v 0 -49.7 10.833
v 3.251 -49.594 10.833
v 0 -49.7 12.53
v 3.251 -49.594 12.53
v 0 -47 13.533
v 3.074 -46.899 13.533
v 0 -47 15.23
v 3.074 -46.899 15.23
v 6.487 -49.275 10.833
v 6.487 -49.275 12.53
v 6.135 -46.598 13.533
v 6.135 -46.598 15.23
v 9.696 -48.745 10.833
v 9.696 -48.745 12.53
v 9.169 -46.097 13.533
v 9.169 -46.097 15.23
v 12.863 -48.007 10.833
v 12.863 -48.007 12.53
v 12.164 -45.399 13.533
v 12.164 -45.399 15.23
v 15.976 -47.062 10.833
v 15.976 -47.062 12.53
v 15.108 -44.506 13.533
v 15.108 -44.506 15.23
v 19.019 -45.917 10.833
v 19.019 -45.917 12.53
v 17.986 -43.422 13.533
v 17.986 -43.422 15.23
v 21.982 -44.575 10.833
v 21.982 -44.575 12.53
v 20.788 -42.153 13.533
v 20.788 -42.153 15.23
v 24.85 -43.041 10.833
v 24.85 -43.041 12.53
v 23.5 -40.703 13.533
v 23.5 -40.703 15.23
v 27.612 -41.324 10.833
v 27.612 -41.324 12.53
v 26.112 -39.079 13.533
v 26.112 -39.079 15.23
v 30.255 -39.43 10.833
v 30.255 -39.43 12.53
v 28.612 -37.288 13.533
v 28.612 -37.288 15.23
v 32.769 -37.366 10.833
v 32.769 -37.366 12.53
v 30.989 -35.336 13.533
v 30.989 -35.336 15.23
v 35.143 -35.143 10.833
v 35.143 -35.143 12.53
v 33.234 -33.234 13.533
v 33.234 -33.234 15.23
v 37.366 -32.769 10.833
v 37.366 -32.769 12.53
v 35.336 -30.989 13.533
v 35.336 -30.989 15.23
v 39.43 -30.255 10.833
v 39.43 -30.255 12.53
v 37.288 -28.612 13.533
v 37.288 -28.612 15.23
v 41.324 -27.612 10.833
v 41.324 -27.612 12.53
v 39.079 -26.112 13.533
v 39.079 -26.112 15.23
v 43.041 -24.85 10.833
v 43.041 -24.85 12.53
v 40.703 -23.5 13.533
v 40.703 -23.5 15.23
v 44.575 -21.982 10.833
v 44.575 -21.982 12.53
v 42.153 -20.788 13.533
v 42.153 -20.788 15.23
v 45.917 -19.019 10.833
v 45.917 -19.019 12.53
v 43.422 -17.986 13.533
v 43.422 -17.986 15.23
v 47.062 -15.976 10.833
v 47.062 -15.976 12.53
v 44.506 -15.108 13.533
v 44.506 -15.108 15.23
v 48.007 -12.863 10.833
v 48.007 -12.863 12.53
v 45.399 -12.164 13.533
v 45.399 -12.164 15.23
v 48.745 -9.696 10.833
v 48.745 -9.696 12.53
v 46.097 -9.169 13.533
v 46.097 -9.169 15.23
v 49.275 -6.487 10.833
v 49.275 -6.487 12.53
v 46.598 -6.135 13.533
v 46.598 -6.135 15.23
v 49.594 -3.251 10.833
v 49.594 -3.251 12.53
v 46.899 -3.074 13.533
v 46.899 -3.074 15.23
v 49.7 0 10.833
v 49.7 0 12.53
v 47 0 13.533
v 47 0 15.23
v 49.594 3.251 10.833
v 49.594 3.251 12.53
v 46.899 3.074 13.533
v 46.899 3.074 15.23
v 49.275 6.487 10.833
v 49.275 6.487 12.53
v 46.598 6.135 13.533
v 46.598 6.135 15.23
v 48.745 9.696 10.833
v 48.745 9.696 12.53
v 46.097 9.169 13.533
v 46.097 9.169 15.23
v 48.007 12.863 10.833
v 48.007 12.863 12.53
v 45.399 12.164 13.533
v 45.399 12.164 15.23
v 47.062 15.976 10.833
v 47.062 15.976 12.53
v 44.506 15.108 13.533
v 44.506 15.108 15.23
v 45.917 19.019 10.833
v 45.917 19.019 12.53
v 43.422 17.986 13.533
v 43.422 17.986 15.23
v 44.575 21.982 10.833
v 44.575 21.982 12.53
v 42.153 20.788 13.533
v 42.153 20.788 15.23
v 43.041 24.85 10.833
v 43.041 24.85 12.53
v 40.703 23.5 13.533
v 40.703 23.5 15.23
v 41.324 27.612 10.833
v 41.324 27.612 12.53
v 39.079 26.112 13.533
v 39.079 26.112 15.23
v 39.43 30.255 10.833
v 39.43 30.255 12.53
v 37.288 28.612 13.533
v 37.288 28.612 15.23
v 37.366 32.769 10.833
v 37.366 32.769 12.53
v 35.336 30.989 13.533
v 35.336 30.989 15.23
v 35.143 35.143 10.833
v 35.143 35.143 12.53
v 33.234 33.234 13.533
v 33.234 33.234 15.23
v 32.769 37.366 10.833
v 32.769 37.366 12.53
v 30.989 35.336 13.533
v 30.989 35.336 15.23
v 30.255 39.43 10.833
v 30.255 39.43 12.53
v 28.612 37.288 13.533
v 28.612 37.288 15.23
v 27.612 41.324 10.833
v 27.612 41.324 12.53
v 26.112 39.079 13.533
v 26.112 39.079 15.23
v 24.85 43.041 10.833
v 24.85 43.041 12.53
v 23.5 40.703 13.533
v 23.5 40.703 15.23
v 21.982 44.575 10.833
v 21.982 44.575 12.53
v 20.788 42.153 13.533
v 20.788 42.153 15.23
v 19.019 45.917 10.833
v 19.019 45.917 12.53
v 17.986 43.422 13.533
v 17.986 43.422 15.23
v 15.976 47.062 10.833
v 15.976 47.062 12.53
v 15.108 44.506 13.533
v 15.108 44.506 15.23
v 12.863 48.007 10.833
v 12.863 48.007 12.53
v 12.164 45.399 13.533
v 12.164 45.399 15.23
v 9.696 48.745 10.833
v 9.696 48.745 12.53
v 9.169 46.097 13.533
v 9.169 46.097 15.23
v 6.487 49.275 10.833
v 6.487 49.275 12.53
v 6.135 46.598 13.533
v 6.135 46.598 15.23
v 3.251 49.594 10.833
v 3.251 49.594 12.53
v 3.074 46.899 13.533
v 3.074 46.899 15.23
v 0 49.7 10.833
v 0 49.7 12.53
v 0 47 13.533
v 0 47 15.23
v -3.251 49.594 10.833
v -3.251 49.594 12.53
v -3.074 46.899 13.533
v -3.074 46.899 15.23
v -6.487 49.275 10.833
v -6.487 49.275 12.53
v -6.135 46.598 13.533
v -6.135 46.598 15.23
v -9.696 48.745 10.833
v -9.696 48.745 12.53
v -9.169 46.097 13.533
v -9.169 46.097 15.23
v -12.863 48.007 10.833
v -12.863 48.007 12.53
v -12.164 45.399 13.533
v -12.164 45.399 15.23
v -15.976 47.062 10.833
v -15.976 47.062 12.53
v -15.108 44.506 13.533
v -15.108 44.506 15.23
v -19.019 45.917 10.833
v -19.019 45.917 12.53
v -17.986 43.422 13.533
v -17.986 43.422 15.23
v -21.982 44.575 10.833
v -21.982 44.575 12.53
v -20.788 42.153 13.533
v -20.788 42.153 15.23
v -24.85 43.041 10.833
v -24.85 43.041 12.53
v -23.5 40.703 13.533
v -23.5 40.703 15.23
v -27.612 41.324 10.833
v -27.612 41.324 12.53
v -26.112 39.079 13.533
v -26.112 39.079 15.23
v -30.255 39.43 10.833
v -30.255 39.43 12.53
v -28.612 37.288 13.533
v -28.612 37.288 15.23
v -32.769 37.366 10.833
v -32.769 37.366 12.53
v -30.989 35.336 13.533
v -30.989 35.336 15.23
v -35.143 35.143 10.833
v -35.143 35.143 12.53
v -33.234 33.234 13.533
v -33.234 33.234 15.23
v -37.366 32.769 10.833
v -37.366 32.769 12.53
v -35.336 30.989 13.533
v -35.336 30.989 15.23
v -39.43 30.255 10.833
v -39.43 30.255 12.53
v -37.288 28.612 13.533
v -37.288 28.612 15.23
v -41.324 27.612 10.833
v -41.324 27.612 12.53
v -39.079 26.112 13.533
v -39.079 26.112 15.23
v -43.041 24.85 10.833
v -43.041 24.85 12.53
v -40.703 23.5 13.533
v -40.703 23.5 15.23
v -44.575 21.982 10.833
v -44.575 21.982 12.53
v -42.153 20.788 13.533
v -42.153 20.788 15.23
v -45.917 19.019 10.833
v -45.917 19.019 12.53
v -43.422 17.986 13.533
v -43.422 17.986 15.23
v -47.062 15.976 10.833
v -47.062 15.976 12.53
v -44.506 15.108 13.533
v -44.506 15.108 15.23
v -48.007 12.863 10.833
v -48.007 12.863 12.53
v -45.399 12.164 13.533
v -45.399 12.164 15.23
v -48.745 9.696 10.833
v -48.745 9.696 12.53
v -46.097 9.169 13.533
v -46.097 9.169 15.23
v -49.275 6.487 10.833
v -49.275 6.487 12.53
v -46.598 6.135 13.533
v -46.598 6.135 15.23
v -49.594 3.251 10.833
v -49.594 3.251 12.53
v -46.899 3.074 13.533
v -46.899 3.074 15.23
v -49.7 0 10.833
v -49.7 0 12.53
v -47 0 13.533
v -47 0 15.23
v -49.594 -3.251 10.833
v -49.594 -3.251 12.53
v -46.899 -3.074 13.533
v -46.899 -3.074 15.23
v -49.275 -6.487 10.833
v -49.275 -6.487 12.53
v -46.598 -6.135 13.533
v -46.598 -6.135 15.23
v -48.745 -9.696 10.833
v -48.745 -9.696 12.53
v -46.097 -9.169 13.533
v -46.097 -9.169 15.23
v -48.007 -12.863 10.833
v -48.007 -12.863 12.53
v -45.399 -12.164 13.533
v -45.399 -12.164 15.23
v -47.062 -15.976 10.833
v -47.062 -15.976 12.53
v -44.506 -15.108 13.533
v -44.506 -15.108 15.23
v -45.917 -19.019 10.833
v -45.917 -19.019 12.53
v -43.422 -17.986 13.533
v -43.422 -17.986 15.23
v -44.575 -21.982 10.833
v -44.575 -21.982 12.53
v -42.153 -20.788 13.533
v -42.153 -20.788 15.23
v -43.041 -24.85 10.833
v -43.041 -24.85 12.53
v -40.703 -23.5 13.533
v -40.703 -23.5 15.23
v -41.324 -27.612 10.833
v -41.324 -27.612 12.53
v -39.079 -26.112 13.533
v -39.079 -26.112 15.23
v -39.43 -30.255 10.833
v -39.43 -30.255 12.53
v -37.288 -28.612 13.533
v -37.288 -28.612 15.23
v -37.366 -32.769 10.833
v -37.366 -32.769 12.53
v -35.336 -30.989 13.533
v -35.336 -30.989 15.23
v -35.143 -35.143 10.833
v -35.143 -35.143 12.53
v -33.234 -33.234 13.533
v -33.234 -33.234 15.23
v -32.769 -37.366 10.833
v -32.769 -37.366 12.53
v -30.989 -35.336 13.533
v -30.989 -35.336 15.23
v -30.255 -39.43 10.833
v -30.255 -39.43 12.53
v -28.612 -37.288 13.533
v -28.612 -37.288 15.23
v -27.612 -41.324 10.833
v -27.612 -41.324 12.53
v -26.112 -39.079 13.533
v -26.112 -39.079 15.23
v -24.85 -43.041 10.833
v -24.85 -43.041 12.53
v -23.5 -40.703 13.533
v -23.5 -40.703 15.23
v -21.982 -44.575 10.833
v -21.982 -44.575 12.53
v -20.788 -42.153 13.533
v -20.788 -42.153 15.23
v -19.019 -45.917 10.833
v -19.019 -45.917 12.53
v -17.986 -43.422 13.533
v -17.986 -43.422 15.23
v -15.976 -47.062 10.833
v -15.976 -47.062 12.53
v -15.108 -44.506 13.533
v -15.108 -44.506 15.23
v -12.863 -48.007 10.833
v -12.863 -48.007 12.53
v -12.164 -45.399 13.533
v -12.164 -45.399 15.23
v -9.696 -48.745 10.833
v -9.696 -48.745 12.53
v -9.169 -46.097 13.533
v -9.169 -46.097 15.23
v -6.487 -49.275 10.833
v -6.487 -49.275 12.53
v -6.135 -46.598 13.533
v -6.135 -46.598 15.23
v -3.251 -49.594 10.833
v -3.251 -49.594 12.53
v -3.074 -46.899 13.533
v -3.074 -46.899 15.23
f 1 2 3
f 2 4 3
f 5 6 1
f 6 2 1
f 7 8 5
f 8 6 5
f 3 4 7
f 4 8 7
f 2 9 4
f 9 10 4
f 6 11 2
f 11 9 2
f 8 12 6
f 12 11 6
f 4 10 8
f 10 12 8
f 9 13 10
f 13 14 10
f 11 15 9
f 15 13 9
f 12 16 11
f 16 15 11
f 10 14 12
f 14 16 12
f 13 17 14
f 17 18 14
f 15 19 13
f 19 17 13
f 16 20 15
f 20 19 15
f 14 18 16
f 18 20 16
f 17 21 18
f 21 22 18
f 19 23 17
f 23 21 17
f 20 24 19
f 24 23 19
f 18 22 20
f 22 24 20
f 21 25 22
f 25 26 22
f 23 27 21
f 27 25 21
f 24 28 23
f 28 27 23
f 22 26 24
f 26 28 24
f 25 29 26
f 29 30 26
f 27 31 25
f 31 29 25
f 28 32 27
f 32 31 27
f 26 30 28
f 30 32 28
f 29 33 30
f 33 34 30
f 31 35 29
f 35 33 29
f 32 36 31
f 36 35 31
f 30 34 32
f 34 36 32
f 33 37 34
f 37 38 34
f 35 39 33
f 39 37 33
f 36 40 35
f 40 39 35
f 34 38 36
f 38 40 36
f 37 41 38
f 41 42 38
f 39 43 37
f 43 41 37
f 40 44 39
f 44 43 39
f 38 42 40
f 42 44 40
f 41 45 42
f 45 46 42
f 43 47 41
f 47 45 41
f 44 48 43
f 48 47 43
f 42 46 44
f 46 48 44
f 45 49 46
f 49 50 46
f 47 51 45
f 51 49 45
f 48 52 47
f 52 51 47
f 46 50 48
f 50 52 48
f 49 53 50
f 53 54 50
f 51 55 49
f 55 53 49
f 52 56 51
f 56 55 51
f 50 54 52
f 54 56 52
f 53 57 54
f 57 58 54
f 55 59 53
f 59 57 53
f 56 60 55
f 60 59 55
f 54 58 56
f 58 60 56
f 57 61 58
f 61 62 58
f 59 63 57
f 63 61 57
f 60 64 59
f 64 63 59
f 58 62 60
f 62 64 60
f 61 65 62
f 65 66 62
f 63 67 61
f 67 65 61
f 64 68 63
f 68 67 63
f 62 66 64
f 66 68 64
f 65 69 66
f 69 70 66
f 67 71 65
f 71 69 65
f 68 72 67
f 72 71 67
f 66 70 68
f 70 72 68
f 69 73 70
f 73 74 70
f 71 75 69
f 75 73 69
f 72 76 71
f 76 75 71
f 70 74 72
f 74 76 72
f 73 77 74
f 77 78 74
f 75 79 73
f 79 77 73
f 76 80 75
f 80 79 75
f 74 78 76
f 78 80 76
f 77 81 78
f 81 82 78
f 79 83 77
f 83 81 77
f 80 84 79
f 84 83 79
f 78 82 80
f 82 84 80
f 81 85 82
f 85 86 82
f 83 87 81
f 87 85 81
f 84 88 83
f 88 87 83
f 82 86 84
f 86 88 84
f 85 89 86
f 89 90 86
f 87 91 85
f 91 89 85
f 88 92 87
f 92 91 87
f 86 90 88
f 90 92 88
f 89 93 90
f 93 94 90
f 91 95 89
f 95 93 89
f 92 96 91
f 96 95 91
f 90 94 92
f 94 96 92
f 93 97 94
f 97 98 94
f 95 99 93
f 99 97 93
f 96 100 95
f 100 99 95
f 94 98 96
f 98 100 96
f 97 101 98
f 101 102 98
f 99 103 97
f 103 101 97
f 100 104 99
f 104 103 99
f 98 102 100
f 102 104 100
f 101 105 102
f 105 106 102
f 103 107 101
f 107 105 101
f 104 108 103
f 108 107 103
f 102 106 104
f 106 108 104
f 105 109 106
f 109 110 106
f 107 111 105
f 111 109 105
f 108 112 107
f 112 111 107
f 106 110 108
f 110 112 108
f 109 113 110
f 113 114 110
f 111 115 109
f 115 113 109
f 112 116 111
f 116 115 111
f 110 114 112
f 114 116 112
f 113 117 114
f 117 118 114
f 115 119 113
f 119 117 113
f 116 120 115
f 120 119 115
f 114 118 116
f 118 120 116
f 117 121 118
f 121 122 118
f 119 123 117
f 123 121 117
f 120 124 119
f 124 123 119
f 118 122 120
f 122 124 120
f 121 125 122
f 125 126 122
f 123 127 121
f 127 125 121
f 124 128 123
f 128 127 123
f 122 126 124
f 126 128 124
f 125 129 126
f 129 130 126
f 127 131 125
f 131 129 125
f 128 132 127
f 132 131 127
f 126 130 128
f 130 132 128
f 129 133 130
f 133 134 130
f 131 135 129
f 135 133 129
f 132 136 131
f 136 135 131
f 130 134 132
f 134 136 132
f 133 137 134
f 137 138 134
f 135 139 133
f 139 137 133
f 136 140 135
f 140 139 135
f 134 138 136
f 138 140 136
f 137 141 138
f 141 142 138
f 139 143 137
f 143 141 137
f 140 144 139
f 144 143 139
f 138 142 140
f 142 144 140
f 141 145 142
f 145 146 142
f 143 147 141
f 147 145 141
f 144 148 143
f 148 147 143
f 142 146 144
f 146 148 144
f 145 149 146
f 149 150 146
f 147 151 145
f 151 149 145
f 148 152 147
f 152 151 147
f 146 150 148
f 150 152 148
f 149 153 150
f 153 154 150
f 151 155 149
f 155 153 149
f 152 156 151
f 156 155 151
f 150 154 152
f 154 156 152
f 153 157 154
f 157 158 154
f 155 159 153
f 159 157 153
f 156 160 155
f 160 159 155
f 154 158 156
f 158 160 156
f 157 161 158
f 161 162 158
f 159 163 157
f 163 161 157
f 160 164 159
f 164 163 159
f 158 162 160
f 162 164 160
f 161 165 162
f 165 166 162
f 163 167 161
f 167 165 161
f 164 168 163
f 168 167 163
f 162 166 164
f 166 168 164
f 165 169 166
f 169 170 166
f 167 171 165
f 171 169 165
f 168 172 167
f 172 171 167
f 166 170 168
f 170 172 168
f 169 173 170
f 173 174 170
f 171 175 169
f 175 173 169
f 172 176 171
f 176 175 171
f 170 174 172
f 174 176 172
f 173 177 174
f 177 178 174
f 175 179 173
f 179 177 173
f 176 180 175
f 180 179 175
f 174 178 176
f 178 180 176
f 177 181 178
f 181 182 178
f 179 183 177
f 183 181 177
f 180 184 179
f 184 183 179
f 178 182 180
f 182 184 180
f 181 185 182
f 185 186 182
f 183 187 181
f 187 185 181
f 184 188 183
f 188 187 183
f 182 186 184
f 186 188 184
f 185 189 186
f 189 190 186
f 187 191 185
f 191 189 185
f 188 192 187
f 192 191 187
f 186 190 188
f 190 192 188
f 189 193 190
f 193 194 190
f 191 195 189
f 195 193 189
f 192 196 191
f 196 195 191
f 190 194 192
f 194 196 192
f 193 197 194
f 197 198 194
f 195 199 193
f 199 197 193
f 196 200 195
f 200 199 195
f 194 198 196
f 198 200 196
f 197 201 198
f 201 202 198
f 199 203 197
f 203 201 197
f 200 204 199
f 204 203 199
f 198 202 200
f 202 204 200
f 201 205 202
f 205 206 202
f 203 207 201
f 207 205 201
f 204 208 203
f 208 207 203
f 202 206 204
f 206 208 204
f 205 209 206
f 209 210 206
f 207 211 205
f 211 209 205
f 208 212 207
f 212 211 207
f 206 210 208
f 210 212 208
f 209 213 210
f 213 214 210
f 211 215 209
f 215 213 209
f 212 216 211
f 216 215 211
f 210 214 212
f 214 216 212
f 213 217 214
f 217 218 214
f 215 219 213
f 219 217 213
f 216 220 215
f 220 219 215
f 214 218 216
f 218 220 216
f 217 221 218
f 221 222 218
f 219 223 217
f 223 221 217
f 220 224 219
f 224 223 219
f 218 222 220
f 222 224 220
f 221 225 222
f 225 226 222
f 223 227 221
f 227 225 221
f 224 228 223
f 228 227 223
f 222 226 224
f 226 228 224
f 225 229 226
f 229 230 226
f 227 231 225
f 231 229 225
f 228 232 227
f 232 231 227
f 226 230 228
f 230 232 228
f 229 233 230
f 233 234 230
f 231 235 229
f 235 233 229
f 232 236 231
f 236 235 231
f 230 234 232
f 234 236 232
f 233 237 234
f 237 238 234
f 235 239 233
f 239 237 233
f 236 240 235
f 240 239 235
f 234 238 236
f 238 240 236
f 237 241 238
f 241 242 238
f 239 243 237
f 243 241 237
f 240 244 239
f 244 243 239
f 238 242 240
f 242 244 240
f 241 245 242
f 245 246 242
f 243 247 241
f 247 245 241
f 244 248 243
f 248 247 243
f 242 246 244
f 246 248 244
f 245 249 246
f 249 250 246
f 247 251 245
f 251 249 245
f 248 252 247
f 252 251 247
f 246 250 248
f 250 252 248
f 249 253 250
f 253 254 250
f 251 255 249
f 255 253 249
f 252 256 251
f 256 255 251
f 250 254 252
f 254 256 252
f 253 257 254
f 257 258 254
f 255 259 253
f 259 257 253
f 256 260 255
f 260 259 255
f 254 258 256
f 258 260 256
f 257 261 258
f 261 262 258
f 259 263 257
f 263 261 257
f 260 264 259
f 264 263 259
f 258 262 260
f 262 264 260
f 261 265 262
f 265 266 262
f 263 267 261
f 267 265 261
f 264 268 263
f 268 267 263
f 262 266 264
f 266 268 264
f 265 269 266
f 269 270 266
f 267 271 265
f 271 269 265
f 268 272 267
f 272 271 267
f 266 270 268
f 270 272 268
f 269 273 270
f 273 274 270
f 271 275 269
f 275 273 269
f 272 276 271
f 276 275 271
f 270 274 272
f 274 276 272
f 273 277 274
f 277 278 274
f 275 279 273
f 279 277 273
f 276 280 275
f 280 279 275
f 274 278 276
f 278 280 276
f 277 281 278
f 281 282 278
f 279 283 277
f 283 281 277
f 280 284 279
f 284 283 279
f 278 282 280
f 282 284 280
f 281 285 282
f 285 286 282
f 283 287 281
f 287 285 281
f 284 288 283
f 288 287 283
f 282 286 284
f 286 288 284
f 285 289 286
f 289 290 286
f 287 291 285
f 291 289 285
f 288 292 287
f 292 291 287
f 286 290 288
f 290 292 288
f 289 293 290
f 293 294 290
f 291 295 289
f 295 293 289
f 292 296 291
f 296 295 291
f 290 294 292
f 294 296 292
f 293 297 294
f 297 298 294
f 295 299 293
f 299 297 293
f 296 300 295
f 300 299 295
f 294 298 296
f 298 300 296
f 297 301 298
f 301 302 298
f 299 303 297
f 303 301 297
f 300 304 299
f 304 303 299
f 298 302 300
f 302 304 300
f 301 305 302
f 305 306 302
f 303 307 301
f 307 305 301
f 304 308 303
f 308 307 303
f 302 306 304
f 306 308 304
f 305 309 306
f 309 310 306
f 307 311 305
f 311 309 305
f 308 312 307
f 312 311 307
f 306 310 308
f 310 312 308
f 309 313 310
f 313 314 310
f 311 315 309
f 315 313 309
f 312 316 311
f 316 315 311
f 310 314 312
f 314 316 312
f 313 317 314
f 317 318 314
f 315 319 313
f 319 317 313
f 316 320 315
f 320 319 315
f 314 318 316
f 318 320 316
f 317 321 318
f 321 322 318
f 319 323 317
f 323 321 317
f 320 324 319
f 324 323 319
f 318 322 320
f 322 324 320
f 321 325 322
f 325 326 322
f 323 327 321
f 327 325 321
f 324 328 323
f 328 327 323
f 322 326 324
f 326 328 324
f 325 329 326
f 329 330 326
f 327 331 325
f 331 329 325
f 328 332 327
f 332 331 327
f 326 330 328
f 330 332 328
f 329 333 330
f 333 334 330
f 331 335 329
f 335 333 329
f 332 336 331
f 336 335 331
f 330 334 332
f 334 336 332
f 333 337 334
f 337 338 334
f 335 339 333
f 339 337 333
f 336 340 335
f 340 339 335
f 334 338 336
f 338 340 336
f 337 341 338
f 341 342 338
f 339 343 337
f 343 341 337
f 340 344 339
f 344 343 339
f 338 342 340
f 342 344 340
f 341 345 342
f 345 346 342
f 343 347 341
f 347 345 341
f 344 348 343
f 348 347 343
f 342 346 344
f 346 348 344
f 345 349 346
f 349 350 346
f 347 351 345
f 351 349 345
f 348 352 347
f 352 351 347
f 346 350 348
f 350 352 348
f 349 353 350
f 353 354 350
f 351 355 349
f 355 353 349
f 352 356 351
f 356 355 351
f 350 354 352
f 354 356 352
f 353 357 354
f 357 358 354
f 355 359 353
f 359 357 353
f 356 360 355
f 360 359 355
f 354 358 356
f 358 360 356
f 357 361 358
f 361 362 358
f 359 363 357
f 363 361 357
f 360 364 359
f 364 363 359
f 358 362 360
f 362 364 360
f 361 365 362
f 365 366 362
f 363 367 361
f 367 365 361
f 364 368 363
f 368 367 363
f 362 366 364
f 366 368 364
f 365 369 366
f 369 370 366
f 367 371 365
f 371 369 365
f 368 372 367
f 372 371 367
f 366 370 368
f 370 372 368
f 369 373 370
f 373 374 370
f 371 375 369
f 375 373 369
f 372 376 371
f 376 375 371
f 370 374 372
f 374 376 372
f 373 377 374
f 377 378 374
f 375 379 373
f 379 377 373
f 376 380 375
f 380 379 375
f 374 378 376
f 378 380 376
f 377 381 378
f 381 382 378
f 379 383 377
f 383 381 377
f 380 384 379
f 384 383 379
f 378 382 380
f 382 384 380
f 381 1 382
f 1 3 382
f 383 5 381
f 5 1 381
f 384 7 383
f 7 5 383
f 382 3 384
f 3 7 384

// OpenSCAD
include <../lib/servo-duct-manifold-lib.scad>;
$fn = 96;
valve_body_gasket();
